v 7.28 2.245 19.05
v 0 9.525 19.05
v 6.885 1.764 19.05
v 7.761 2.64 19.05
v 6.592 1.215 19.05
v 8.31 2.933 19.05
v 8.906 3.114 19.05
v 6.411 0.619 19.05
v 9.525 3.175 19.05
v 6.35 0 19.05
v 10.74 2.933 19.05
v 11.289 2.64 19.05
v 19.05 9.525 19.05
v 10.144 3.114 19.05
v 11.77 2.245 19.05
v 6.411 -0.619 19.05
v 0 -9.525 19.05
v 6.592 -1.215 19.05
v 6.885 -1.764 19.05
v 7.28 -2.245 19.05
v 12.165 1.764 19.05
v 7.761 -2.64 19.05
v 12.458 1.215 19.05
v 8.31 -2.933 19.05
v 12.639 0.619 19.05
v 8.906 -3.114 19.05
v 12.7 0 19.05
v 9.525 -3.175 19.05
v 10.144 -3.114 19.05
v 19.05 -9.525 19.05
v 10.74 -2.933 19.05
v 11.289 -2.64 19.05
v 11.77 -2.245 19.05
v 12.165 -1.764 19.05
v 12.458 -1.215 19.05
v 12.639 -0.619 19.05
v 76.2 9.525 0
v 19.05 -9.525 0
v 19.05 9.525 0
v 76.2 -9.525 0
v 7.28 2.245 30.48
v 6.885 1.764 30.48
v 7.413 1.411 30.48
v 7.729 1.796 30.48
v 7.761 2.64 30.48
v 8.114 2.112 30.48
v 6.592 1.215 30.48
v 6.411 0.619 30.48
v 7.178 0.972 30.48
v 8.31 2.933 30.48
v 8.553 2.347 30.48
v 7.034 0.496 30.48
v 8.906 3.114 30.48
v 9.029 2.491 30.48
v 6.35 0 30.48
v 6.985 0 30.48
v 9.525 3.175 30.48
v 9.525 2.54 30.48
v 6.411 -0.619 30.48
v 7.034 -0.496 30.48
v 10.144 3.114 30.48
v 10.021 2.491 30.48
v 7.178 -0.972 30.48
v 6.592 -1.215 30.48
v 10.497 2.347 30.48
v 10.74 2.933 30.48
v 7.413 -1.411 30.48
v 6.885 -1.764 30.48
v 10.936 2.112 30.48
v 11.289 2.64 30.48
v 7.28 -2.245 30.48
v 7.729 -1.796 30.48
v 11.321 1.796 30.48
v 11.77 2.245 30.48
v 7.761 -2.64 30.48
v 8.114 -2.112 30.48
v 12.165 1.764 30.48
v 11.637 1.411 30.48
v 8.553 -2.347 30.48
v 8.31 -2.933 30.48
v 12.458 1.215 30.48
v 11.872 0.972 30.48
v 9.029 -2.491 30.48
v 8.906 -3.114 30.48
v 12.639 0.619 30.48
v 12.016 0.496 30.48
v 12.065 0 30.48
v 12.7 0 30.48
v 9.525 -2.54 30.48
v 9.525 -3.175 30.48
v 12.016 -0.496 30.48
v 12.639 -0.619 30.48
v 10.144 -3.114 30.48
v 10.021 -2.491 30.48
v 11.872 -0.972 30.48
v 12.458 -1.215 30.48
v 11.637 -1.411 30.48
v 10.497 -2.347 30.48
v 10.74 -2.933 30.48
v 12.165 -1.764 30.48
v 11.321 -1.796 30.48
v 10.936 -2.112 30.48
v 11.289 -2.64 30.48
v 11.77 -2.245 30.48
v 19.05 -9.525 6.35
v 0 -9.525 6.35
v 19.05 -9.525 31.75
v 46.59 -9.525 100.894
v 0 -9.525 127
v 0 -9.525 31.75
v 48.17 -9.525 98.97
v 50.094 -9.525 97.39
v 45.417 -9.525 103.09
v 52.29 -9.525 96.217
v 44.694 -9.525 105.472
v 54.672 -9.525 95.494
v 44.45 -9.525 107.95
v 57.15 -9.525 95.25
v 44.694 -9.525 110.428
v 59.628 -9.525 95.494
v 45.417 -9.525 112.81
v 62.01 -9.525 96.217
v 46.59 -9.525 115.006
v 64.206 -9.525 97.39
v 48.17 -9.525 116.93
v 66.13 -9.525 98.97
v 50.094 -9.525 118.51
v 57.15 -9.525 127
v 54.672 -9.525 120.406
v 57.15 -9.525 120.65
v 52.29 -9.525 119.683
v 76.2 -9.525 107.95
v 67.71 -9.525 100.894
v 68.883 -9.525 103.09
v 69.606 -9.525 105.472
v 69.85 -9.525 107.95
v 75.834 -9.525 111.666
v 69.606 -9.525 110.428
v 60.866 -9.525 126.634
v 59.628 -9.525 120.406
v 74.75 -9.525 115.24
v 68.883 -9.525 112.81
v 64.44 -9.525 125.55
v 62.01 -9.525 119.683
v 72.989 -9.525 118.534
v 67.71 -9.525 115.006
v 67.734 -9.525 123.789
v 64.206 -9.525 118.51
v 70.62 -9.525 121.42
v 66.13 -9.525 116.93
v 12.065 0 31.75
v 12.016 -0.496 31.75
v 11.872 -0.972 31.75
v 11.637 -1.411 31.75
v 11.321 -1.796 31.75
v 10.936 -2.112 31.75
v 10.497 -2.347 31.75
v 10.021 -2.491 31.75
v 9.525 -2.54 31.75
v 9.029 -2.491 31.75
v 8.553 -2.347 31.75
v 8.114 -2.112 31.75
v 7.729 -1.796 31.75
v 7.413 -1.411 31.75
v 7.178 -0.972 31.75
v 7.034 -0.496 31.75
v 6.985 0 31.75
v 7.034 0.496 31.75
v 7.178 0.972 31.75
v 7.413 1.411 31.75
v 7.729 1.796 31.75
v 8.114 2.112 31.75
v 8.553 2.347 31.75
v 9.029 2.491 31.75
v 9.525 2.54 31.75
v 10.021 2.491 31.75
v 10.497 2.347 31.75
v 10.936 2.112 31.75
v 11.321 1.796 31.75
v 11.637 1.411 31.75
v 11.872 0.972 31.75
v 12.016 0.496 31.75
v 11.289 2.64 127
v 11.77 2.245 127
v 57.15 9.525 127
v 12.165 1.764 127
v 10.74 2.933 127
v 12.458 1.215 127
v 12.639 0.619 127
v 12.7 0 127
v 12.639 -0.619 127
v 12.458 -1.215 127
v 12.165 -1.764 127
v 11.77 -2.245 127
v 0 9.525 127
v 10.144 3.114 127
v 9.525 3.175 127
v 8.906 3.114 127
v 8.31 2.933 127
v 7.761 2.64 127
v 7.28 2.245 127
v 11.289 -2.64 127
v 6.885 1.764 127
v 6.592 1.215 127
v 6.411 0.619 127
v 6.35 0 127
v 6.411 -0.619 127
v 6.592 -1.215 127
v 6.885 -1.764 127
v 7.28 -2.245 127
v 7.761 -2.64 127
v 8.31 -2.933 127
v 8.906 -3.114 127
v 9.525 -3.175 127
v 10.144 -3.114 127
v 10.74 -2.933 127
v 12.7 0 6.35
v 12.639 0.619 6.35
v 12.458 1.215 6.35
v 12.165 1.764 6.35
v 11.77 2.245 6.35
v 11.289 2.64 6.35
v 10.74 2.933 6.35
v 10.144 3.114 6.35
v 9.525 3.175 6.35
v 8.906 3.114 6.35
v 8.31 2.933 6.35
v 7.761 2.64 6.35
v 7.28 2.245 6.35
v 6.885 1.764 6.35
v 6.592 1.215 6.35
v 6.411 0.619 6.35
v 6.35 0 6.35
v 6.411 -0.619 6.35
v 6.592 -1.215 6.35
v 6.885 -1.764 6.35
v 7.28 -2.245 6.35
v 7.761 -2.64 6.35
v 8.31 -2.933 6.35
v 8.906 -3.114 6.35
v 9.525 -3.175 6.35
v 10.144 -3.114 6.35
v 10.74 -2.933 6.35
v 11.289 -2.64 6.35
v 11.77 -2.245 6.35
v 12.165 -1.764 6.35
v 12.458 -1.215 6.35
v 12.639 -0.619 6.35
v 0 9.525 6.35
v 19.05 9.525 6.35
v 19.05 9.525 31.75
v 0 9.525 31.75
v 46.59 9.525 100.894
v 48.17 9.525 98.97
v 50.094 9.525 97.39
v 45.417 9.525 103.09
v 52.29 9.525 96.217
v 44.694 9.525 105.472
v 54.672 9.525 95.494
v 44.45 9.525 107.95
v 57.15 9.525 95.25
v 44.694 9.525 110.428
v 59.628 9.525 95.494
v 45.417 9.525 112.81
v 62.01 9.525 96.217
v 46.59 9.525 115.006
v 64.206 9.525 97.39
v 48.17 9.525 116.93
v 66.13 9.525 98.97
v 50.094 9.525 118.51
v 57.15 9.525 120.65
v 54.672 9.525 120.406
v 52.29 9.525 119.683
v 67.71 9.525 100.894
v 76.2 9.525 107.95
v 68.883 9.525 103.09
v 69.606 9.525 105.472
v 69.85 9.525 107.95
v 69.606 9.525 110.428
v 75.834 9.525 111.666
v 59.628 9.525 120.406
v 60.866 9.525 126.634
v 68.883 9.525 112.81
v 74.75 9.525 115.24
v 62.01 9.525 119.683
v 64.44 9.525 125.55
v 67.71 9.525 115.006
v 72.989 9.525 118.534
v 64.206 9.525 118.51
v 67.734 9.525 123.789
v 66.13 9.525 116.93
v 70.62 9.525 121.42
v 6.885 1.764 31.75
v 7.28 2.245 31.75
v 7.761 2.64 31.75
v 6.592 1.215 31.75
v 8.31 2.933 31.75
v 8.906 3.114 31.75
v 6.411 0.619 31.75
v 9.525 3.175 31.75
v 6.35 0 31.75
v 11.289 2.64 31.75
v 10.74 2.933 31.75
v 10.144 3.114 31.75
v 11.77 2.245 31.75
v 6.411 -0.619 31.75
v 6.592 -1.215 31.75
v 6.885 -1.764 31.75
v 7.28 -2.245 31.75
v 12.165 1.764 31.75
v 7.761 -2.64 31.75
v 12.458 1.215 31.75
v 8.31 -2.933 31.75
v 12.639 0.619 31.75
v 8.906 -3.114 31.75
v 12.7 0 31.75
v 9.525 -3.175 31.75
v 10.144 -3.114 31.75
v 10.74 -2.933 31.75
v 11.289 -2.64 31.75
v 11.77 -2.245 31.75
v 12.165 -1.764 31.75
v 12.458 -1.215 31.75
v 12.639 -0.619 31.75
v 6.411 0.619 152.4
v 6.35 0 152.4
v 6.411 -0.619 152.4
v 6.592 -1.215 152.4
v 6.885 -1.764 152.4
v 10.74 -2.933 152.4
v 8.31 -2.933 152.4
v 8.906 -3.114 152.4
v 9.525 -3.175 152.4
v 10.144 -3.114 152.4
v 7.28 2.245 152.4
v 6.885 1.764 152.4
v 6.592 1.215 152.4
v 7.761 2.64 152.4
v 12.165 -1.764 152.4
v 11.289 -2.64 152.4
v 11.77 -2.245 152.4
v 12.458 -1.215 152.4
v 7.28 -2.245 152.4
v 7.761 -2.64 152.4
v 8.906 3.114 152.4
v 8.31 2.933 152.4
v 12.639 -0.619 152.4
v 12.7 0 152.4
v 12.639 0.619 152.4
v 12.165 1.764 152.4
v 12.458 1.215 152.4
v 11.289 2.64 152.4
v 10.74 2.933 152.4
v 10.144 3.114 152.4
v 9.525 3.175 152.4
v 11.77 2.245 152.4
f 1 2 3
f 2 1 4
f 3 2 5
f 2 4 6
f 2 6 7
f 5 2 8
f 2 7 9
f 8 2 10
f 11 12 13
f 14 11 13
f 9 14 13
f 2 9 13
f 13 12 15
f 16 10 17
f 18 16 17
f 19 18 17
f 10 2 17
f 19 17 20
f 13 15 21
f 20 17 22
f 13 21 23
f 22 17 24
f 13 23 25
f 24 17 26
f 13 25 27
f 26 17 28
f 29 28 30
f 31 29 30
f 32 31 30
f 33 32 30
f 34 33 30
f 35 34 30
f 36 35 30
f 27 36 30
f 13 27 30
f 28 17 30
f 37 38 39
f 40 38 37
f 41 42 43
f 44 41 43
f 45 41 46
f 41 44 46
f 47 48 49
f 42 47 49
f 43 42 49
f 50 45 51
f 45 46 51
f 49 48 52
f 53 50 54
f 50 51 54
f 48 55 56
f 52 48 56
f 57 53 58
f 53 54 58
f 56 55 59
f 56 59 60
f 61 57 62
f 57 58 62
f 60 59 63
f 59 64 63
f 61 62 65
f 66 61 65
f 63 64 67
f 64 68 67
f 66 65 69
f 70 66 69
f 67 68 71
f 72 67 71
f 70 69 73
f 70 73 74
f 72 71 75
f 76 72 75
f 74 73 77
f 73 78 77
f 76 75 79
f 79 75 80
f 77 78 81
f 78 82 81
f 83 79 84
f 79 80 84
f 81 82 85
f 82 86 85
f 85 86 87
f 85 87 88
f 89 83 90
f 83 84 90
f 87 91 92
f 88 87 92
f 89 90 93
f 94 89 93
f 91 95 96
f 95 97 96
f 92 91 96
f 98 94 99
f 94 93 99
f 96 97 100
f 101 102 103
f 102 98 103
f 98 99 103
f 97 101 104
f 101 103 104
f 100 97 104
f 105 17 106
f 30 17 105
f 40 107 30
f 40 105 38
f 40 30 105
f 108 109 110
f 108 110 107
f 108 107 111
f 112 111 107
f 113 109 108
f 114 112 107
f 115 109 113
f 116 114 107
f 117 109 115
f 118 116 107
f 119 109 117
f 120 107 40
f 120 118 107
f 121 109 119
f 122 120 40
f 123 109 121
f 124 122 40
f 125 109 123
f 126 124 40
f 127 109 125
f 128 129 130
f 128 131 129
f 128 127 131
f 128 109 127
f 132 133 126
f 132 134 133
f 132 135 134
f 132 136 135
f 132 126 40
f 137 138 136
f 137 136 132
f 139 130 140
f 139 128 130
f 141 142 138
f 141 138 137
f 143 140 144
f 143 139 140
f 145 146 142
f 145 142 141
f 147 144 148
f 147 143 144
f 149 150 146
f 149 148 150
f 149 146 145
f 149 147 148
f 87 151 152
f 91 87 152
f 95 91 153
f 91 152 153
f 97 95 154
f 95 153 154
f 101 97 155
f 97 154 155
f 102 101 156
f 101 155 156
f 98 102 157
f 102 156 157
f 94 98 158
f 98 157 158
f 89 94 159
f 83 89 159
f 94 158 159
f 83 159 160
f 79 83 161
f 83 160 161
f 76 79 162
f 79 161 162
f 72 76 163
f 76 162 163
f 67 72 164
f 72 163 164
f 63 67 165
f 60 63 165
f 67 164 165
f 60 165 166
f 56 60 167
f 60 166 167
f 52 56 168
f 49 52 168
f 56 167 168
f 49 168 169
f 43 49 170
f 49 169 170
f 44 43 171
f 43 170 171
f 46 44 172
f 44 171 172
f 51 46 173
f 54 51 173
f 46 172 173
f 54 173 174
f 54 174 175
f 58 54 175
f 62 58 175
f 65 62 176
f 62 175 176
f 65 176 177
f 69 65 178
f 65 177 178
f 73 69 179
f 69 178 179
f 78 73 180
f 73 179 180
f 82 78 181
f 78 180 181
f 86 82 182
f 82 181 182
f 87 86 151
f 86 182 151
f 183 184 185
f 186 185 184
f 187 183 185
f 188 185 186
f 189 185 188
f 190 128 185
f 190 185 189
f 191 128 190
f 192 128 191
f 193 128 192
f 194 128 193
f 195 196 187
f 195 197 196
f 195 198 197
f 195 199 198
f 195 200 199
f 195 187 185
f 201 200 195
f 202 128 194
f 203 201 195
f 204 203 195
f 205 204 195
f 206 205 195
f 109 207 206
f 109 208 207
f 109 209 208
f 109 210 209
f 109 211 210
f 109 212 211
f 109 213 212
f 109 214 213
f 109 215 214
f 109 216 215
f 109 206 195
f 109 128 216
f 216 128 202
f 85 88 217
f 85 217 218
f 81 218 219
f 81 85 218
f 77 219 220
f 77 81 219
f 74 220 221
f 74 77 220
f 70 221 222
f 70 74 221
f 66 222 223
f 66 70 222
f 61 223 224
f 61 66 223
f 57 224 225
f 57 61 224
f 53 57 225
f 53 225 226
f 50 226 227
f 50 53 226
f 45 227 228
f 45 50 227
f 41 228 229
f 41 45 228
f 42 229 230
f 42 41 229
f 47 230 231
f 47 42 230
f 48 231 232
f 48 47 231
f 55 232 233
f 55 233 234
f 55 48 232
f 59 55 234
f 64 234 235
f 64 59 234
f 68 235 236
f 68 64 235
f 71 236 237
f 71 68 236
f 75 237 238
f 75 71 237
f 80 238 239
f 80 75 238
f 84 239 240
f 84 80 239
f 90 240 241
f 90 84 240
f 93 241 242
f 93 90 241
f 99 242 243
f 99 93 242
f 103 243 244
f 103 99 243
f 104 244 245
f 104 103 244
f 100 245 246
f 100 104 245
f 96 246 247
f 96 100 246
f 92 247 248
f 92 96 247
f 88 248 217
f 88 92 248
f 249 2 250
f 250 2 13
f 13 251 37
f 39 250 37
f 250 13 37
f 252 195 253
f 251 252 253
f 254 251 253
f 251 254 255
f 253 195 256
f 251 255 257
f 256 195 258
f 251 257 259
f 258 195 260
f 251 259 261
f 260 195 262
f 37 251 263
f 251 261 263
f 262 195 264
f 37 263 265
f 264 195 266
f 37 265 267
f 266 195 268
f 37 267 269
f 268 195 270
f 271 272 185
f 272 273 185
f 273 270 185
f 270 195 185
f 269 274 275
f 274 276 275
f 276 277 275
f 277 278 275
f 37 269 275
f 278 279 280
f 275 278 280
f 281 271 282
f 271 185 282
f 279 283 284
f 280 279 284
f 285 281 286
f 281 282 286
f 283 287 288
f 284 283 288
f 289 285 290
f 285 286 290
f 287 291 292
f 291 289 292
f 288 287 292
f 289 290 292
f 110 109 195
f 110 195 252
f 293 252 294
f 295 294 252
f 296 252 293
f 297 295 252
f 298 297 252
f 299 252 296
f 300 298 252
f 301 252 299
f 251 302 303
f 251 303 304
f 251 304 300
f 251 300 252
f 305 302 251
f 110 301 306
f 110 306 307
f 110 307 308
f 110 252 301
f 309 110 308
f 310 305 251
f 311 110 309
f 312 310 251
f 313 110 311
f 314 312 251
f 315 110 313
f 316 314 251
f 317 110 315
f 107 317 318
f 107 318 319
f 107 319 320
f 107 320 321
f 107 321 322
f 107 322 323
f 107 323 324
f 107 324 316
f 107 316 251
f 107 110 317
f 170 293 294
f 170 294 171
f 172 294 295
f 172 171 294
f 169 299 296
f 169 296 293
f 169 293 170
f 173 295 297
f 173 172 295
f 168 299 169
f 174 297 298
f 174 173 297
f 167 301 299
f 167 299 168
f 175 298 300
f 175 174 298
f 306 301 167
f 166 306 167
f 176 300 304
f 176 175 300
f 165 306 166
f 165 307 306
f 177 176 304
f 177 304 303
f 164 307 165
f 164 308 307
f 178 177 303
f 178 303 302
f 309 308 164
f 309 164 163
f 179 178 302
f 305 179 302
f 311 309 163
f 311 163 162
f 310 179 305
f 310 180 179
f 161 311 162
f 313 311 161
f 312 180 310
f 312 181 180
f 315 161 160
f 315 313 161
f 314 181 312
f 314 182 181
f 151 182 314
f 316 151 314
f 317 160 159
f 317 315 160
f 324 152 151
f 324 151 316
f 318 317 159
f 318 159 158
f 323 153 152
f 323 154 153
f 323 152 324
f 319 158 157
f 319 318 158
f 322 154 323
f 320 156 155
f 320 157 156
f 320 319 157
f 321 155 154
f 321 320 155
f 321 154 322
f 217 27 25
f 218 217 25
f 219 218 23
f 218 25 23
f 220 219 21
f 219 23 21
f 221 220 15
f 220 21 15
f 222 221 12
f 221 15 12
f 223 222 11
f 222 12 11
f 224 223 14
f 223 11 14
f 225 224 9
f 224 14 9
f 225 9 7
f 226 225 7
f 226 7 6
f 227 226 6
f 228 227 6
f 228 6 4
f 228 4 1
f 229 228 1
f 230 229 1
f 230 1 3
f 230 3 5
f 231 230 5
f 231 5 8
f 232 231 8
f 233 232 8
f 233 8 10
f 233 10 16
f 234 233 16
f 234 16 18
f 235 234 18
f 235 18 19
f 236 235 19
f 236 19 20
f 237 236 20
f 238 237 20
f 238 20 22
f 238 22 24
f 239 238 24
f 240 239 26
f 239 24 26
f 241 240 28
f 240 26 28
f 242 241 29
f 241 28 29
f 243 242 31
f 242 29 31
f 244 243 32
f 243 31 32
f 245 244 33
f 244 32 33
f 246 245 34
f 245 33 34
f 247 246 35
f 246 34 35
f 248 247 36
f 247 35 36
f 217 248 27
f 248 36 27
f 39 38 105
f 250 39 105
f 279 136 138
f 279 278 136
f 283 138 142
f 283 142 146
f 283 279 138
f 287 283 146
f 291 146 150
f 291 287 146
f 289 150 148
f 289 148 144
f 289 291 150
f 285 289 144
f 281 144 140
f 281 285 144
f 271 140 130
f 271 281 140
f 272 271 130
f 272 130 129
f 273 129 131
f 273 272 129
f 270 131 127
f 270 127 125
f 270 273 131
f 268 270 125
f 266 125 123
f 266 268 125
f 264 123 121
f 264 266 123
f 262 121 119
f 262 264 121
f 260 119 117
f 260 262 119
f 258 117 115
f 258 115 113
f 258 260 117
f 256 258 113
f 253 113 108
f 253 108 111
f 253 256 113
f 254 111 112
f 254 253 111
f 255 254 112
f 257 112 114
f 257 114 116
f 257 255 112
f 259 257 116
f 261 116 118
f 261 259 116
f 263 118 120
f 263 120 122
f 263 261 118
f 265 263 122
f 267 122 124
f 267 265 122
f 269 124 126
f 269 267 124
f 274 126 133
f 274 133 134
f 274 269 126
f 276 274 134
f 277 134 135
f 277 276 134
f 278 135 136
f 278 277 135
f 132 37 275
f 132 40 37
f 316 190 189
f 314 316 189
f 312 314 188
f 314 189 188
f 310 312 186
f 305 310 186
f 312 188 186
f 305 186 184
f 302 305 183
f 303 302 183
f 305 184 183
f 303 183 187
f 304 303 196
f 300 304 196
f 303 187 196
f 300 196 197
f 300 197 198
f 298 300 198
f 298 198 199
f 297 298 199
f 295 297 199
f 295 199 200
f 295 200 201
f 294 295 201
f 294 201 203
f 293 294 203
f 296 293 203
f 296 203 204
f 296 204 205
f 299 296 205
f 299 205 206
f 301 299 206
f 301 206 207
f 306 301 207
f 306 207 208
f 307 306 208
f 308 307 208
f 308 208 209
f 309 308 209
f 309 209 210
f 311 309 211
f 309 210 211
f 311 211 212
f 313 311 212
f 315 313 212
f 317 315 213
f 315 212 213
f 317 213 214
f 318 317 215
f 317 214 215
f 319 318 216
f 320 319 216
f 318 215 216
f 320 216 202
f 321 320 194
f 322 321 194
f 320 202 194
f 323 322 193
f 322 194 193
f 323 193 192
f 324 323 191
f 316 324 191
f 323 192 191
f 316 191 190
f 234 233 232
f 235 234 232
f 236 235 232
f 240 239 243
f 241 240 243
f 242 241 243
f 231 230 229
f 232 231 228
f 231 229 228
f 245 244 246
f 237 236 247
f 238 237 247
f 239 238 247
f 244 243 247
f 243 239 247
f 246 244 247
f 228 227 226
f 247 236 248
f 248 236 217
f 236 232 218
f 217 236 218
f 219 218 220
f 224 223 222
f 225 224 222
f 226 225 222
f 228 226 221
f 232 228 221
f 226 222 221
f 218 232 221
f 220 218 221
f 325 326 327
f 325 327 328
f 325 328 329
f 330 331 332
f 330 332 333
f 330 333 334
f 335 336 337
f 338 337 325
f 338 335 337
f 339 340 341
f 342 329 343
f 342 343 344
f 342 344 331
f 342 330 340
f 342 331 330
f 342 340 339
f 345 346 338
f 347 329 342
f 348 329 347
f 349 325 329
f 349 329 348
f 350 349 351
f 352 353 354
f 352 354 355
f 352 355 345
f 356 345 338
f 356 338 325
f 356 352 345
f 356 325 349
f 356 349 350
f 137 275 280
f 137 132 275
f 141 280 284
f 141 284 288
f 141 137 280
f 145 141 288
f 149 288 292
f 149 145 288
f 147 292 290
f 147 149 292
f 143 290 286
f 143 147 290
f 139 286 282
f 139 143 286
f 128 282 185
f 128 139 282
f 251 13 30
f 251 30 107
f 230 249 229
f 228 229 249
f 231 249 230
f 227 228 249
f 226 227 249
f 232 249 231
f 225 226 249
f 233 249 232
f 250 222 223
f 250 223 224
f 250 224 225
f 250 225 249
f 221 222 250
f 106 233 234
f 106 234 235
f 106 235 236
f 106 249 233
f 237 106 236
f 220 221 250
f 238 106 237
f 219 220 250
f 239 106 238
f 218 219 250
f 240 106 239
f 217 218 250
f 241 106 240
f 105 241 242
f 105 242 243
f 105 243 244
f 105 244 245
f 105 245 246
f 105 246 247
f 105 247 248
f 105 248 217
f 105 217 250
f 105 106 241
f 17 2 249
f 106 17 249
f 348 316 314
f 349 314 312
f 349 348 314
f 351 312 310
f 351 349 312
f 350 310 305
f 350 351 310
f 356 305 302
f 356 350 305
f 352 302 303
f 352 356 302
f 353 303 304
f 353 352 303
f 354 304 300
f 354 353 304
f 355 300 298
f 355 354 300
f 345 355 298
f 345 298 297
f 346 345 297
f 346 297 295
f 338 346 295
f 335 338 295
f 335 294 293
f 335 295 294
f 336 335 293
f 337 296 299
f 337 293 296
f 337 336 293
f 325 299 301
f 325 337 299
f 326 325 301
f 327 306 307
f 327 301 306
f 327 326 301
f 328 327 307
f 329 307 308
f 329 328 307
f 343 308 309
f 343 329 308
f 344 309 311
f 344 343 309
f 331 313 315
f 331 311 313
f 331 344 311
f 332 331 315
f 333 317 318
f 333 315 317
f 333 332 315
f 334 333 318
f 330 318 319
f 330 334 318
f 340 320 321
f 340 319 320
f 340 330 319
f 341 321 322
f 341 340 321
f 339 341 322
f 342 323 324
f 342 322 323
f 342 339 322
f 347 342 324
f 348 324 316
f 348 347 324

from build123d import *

# Parameters (mm, degrees)
F0_R          = 12.7
F1_DEPTH      = 9.525
F2_W          = 19.05
F2_H          = 6.35
F2_H_2        = 12.7
F3_DEPTH      = 9.526
F3_DEPTH_BACK = 9.526
F4_R          = 3.175
F5_DEPTH      = 127.001
F6_DEPTH      = 25.4
F6_DEPTH_BACK = 120.65
F7_R          = 3.175
F7_R_2        = 2.54
F8_DEPTH      = 1.27


with BuildPart() as f1:
    # F0 (on Front) → F1 (new body, symmetric)
    with BuildSketch(Plane.XZ):
        with BuildLine():
            Line((57.15, 127), (0, 127))
            Line((0, 127), (0, 0))
            Line((0, 0), (76.2, 0))
            Line((76.2, 0), (76.2, 107.95))
            ThreePointArc((76.2, 107.95), (70.6203841816, 121.4203841816), (57.15, 127))
        make_face()
        with Locations((57.15, 107.95)):
            Circle(F0_R, mode=Mode.SUBTRACT)
    extrude(amount=F1_DEPTH, both=True)

    # F2 (on Front) → F3 (cut, two sides)
    with BuildSketch(Plane.XZ) as f3_sk:
        with Locations((9.525, 3.175)):
            Rectangle(F2_W, F2_H)
        with Locations((9.525, 25.4)):
            Rectangle(F2_W, F2_H_2)
    extrude(amount=-F3_DEPTH, mode=Mode.SUBTRACT)
    extrude(f3_sk.sketch, amount=F3_DEPTH_BACK, mode=Mode.SUBTRACT)

    # F4 (on face) → F5 (cut, through all)
    with BuildSketch(Plane.XY.offset(127)):
        with Locations((9.525, 0)):
            Circle(F4_R)
    extrude(amount=-F5_DEPTH, mode=Mode.SUBTRACT)


with BuildPart() as f6:
    # F4 (on face) → F6 (new body, two sides)
    with BuildSketch(Plane.XY.offset(127)) as f6_sk:
        with Locations((9.525, 0)):
            Circle(F4_R)
    extrude(amount=F6_DEPTH)
    extrude(f6_sk.sketch, amount=-F6_DEPTH_BACK)

    # F7 (on face) → F8 (cut)
    with BuildSketch(Plane(origin=(0, 0, 31.75), x_dir=(1, 0, 0), z_dir=(0, 0, -1))):
        with Locations((9.525, 0)):
            Circle(F7_R)
        with Locations((9.525, 0)):
            Circle(F7_R_2, mode=Mode.SUBTRACT)
    extrude(amount=F8_DEPTH, mode=Mode.SUBTRACT)


solid = Compound([f1.part, f6.part])
